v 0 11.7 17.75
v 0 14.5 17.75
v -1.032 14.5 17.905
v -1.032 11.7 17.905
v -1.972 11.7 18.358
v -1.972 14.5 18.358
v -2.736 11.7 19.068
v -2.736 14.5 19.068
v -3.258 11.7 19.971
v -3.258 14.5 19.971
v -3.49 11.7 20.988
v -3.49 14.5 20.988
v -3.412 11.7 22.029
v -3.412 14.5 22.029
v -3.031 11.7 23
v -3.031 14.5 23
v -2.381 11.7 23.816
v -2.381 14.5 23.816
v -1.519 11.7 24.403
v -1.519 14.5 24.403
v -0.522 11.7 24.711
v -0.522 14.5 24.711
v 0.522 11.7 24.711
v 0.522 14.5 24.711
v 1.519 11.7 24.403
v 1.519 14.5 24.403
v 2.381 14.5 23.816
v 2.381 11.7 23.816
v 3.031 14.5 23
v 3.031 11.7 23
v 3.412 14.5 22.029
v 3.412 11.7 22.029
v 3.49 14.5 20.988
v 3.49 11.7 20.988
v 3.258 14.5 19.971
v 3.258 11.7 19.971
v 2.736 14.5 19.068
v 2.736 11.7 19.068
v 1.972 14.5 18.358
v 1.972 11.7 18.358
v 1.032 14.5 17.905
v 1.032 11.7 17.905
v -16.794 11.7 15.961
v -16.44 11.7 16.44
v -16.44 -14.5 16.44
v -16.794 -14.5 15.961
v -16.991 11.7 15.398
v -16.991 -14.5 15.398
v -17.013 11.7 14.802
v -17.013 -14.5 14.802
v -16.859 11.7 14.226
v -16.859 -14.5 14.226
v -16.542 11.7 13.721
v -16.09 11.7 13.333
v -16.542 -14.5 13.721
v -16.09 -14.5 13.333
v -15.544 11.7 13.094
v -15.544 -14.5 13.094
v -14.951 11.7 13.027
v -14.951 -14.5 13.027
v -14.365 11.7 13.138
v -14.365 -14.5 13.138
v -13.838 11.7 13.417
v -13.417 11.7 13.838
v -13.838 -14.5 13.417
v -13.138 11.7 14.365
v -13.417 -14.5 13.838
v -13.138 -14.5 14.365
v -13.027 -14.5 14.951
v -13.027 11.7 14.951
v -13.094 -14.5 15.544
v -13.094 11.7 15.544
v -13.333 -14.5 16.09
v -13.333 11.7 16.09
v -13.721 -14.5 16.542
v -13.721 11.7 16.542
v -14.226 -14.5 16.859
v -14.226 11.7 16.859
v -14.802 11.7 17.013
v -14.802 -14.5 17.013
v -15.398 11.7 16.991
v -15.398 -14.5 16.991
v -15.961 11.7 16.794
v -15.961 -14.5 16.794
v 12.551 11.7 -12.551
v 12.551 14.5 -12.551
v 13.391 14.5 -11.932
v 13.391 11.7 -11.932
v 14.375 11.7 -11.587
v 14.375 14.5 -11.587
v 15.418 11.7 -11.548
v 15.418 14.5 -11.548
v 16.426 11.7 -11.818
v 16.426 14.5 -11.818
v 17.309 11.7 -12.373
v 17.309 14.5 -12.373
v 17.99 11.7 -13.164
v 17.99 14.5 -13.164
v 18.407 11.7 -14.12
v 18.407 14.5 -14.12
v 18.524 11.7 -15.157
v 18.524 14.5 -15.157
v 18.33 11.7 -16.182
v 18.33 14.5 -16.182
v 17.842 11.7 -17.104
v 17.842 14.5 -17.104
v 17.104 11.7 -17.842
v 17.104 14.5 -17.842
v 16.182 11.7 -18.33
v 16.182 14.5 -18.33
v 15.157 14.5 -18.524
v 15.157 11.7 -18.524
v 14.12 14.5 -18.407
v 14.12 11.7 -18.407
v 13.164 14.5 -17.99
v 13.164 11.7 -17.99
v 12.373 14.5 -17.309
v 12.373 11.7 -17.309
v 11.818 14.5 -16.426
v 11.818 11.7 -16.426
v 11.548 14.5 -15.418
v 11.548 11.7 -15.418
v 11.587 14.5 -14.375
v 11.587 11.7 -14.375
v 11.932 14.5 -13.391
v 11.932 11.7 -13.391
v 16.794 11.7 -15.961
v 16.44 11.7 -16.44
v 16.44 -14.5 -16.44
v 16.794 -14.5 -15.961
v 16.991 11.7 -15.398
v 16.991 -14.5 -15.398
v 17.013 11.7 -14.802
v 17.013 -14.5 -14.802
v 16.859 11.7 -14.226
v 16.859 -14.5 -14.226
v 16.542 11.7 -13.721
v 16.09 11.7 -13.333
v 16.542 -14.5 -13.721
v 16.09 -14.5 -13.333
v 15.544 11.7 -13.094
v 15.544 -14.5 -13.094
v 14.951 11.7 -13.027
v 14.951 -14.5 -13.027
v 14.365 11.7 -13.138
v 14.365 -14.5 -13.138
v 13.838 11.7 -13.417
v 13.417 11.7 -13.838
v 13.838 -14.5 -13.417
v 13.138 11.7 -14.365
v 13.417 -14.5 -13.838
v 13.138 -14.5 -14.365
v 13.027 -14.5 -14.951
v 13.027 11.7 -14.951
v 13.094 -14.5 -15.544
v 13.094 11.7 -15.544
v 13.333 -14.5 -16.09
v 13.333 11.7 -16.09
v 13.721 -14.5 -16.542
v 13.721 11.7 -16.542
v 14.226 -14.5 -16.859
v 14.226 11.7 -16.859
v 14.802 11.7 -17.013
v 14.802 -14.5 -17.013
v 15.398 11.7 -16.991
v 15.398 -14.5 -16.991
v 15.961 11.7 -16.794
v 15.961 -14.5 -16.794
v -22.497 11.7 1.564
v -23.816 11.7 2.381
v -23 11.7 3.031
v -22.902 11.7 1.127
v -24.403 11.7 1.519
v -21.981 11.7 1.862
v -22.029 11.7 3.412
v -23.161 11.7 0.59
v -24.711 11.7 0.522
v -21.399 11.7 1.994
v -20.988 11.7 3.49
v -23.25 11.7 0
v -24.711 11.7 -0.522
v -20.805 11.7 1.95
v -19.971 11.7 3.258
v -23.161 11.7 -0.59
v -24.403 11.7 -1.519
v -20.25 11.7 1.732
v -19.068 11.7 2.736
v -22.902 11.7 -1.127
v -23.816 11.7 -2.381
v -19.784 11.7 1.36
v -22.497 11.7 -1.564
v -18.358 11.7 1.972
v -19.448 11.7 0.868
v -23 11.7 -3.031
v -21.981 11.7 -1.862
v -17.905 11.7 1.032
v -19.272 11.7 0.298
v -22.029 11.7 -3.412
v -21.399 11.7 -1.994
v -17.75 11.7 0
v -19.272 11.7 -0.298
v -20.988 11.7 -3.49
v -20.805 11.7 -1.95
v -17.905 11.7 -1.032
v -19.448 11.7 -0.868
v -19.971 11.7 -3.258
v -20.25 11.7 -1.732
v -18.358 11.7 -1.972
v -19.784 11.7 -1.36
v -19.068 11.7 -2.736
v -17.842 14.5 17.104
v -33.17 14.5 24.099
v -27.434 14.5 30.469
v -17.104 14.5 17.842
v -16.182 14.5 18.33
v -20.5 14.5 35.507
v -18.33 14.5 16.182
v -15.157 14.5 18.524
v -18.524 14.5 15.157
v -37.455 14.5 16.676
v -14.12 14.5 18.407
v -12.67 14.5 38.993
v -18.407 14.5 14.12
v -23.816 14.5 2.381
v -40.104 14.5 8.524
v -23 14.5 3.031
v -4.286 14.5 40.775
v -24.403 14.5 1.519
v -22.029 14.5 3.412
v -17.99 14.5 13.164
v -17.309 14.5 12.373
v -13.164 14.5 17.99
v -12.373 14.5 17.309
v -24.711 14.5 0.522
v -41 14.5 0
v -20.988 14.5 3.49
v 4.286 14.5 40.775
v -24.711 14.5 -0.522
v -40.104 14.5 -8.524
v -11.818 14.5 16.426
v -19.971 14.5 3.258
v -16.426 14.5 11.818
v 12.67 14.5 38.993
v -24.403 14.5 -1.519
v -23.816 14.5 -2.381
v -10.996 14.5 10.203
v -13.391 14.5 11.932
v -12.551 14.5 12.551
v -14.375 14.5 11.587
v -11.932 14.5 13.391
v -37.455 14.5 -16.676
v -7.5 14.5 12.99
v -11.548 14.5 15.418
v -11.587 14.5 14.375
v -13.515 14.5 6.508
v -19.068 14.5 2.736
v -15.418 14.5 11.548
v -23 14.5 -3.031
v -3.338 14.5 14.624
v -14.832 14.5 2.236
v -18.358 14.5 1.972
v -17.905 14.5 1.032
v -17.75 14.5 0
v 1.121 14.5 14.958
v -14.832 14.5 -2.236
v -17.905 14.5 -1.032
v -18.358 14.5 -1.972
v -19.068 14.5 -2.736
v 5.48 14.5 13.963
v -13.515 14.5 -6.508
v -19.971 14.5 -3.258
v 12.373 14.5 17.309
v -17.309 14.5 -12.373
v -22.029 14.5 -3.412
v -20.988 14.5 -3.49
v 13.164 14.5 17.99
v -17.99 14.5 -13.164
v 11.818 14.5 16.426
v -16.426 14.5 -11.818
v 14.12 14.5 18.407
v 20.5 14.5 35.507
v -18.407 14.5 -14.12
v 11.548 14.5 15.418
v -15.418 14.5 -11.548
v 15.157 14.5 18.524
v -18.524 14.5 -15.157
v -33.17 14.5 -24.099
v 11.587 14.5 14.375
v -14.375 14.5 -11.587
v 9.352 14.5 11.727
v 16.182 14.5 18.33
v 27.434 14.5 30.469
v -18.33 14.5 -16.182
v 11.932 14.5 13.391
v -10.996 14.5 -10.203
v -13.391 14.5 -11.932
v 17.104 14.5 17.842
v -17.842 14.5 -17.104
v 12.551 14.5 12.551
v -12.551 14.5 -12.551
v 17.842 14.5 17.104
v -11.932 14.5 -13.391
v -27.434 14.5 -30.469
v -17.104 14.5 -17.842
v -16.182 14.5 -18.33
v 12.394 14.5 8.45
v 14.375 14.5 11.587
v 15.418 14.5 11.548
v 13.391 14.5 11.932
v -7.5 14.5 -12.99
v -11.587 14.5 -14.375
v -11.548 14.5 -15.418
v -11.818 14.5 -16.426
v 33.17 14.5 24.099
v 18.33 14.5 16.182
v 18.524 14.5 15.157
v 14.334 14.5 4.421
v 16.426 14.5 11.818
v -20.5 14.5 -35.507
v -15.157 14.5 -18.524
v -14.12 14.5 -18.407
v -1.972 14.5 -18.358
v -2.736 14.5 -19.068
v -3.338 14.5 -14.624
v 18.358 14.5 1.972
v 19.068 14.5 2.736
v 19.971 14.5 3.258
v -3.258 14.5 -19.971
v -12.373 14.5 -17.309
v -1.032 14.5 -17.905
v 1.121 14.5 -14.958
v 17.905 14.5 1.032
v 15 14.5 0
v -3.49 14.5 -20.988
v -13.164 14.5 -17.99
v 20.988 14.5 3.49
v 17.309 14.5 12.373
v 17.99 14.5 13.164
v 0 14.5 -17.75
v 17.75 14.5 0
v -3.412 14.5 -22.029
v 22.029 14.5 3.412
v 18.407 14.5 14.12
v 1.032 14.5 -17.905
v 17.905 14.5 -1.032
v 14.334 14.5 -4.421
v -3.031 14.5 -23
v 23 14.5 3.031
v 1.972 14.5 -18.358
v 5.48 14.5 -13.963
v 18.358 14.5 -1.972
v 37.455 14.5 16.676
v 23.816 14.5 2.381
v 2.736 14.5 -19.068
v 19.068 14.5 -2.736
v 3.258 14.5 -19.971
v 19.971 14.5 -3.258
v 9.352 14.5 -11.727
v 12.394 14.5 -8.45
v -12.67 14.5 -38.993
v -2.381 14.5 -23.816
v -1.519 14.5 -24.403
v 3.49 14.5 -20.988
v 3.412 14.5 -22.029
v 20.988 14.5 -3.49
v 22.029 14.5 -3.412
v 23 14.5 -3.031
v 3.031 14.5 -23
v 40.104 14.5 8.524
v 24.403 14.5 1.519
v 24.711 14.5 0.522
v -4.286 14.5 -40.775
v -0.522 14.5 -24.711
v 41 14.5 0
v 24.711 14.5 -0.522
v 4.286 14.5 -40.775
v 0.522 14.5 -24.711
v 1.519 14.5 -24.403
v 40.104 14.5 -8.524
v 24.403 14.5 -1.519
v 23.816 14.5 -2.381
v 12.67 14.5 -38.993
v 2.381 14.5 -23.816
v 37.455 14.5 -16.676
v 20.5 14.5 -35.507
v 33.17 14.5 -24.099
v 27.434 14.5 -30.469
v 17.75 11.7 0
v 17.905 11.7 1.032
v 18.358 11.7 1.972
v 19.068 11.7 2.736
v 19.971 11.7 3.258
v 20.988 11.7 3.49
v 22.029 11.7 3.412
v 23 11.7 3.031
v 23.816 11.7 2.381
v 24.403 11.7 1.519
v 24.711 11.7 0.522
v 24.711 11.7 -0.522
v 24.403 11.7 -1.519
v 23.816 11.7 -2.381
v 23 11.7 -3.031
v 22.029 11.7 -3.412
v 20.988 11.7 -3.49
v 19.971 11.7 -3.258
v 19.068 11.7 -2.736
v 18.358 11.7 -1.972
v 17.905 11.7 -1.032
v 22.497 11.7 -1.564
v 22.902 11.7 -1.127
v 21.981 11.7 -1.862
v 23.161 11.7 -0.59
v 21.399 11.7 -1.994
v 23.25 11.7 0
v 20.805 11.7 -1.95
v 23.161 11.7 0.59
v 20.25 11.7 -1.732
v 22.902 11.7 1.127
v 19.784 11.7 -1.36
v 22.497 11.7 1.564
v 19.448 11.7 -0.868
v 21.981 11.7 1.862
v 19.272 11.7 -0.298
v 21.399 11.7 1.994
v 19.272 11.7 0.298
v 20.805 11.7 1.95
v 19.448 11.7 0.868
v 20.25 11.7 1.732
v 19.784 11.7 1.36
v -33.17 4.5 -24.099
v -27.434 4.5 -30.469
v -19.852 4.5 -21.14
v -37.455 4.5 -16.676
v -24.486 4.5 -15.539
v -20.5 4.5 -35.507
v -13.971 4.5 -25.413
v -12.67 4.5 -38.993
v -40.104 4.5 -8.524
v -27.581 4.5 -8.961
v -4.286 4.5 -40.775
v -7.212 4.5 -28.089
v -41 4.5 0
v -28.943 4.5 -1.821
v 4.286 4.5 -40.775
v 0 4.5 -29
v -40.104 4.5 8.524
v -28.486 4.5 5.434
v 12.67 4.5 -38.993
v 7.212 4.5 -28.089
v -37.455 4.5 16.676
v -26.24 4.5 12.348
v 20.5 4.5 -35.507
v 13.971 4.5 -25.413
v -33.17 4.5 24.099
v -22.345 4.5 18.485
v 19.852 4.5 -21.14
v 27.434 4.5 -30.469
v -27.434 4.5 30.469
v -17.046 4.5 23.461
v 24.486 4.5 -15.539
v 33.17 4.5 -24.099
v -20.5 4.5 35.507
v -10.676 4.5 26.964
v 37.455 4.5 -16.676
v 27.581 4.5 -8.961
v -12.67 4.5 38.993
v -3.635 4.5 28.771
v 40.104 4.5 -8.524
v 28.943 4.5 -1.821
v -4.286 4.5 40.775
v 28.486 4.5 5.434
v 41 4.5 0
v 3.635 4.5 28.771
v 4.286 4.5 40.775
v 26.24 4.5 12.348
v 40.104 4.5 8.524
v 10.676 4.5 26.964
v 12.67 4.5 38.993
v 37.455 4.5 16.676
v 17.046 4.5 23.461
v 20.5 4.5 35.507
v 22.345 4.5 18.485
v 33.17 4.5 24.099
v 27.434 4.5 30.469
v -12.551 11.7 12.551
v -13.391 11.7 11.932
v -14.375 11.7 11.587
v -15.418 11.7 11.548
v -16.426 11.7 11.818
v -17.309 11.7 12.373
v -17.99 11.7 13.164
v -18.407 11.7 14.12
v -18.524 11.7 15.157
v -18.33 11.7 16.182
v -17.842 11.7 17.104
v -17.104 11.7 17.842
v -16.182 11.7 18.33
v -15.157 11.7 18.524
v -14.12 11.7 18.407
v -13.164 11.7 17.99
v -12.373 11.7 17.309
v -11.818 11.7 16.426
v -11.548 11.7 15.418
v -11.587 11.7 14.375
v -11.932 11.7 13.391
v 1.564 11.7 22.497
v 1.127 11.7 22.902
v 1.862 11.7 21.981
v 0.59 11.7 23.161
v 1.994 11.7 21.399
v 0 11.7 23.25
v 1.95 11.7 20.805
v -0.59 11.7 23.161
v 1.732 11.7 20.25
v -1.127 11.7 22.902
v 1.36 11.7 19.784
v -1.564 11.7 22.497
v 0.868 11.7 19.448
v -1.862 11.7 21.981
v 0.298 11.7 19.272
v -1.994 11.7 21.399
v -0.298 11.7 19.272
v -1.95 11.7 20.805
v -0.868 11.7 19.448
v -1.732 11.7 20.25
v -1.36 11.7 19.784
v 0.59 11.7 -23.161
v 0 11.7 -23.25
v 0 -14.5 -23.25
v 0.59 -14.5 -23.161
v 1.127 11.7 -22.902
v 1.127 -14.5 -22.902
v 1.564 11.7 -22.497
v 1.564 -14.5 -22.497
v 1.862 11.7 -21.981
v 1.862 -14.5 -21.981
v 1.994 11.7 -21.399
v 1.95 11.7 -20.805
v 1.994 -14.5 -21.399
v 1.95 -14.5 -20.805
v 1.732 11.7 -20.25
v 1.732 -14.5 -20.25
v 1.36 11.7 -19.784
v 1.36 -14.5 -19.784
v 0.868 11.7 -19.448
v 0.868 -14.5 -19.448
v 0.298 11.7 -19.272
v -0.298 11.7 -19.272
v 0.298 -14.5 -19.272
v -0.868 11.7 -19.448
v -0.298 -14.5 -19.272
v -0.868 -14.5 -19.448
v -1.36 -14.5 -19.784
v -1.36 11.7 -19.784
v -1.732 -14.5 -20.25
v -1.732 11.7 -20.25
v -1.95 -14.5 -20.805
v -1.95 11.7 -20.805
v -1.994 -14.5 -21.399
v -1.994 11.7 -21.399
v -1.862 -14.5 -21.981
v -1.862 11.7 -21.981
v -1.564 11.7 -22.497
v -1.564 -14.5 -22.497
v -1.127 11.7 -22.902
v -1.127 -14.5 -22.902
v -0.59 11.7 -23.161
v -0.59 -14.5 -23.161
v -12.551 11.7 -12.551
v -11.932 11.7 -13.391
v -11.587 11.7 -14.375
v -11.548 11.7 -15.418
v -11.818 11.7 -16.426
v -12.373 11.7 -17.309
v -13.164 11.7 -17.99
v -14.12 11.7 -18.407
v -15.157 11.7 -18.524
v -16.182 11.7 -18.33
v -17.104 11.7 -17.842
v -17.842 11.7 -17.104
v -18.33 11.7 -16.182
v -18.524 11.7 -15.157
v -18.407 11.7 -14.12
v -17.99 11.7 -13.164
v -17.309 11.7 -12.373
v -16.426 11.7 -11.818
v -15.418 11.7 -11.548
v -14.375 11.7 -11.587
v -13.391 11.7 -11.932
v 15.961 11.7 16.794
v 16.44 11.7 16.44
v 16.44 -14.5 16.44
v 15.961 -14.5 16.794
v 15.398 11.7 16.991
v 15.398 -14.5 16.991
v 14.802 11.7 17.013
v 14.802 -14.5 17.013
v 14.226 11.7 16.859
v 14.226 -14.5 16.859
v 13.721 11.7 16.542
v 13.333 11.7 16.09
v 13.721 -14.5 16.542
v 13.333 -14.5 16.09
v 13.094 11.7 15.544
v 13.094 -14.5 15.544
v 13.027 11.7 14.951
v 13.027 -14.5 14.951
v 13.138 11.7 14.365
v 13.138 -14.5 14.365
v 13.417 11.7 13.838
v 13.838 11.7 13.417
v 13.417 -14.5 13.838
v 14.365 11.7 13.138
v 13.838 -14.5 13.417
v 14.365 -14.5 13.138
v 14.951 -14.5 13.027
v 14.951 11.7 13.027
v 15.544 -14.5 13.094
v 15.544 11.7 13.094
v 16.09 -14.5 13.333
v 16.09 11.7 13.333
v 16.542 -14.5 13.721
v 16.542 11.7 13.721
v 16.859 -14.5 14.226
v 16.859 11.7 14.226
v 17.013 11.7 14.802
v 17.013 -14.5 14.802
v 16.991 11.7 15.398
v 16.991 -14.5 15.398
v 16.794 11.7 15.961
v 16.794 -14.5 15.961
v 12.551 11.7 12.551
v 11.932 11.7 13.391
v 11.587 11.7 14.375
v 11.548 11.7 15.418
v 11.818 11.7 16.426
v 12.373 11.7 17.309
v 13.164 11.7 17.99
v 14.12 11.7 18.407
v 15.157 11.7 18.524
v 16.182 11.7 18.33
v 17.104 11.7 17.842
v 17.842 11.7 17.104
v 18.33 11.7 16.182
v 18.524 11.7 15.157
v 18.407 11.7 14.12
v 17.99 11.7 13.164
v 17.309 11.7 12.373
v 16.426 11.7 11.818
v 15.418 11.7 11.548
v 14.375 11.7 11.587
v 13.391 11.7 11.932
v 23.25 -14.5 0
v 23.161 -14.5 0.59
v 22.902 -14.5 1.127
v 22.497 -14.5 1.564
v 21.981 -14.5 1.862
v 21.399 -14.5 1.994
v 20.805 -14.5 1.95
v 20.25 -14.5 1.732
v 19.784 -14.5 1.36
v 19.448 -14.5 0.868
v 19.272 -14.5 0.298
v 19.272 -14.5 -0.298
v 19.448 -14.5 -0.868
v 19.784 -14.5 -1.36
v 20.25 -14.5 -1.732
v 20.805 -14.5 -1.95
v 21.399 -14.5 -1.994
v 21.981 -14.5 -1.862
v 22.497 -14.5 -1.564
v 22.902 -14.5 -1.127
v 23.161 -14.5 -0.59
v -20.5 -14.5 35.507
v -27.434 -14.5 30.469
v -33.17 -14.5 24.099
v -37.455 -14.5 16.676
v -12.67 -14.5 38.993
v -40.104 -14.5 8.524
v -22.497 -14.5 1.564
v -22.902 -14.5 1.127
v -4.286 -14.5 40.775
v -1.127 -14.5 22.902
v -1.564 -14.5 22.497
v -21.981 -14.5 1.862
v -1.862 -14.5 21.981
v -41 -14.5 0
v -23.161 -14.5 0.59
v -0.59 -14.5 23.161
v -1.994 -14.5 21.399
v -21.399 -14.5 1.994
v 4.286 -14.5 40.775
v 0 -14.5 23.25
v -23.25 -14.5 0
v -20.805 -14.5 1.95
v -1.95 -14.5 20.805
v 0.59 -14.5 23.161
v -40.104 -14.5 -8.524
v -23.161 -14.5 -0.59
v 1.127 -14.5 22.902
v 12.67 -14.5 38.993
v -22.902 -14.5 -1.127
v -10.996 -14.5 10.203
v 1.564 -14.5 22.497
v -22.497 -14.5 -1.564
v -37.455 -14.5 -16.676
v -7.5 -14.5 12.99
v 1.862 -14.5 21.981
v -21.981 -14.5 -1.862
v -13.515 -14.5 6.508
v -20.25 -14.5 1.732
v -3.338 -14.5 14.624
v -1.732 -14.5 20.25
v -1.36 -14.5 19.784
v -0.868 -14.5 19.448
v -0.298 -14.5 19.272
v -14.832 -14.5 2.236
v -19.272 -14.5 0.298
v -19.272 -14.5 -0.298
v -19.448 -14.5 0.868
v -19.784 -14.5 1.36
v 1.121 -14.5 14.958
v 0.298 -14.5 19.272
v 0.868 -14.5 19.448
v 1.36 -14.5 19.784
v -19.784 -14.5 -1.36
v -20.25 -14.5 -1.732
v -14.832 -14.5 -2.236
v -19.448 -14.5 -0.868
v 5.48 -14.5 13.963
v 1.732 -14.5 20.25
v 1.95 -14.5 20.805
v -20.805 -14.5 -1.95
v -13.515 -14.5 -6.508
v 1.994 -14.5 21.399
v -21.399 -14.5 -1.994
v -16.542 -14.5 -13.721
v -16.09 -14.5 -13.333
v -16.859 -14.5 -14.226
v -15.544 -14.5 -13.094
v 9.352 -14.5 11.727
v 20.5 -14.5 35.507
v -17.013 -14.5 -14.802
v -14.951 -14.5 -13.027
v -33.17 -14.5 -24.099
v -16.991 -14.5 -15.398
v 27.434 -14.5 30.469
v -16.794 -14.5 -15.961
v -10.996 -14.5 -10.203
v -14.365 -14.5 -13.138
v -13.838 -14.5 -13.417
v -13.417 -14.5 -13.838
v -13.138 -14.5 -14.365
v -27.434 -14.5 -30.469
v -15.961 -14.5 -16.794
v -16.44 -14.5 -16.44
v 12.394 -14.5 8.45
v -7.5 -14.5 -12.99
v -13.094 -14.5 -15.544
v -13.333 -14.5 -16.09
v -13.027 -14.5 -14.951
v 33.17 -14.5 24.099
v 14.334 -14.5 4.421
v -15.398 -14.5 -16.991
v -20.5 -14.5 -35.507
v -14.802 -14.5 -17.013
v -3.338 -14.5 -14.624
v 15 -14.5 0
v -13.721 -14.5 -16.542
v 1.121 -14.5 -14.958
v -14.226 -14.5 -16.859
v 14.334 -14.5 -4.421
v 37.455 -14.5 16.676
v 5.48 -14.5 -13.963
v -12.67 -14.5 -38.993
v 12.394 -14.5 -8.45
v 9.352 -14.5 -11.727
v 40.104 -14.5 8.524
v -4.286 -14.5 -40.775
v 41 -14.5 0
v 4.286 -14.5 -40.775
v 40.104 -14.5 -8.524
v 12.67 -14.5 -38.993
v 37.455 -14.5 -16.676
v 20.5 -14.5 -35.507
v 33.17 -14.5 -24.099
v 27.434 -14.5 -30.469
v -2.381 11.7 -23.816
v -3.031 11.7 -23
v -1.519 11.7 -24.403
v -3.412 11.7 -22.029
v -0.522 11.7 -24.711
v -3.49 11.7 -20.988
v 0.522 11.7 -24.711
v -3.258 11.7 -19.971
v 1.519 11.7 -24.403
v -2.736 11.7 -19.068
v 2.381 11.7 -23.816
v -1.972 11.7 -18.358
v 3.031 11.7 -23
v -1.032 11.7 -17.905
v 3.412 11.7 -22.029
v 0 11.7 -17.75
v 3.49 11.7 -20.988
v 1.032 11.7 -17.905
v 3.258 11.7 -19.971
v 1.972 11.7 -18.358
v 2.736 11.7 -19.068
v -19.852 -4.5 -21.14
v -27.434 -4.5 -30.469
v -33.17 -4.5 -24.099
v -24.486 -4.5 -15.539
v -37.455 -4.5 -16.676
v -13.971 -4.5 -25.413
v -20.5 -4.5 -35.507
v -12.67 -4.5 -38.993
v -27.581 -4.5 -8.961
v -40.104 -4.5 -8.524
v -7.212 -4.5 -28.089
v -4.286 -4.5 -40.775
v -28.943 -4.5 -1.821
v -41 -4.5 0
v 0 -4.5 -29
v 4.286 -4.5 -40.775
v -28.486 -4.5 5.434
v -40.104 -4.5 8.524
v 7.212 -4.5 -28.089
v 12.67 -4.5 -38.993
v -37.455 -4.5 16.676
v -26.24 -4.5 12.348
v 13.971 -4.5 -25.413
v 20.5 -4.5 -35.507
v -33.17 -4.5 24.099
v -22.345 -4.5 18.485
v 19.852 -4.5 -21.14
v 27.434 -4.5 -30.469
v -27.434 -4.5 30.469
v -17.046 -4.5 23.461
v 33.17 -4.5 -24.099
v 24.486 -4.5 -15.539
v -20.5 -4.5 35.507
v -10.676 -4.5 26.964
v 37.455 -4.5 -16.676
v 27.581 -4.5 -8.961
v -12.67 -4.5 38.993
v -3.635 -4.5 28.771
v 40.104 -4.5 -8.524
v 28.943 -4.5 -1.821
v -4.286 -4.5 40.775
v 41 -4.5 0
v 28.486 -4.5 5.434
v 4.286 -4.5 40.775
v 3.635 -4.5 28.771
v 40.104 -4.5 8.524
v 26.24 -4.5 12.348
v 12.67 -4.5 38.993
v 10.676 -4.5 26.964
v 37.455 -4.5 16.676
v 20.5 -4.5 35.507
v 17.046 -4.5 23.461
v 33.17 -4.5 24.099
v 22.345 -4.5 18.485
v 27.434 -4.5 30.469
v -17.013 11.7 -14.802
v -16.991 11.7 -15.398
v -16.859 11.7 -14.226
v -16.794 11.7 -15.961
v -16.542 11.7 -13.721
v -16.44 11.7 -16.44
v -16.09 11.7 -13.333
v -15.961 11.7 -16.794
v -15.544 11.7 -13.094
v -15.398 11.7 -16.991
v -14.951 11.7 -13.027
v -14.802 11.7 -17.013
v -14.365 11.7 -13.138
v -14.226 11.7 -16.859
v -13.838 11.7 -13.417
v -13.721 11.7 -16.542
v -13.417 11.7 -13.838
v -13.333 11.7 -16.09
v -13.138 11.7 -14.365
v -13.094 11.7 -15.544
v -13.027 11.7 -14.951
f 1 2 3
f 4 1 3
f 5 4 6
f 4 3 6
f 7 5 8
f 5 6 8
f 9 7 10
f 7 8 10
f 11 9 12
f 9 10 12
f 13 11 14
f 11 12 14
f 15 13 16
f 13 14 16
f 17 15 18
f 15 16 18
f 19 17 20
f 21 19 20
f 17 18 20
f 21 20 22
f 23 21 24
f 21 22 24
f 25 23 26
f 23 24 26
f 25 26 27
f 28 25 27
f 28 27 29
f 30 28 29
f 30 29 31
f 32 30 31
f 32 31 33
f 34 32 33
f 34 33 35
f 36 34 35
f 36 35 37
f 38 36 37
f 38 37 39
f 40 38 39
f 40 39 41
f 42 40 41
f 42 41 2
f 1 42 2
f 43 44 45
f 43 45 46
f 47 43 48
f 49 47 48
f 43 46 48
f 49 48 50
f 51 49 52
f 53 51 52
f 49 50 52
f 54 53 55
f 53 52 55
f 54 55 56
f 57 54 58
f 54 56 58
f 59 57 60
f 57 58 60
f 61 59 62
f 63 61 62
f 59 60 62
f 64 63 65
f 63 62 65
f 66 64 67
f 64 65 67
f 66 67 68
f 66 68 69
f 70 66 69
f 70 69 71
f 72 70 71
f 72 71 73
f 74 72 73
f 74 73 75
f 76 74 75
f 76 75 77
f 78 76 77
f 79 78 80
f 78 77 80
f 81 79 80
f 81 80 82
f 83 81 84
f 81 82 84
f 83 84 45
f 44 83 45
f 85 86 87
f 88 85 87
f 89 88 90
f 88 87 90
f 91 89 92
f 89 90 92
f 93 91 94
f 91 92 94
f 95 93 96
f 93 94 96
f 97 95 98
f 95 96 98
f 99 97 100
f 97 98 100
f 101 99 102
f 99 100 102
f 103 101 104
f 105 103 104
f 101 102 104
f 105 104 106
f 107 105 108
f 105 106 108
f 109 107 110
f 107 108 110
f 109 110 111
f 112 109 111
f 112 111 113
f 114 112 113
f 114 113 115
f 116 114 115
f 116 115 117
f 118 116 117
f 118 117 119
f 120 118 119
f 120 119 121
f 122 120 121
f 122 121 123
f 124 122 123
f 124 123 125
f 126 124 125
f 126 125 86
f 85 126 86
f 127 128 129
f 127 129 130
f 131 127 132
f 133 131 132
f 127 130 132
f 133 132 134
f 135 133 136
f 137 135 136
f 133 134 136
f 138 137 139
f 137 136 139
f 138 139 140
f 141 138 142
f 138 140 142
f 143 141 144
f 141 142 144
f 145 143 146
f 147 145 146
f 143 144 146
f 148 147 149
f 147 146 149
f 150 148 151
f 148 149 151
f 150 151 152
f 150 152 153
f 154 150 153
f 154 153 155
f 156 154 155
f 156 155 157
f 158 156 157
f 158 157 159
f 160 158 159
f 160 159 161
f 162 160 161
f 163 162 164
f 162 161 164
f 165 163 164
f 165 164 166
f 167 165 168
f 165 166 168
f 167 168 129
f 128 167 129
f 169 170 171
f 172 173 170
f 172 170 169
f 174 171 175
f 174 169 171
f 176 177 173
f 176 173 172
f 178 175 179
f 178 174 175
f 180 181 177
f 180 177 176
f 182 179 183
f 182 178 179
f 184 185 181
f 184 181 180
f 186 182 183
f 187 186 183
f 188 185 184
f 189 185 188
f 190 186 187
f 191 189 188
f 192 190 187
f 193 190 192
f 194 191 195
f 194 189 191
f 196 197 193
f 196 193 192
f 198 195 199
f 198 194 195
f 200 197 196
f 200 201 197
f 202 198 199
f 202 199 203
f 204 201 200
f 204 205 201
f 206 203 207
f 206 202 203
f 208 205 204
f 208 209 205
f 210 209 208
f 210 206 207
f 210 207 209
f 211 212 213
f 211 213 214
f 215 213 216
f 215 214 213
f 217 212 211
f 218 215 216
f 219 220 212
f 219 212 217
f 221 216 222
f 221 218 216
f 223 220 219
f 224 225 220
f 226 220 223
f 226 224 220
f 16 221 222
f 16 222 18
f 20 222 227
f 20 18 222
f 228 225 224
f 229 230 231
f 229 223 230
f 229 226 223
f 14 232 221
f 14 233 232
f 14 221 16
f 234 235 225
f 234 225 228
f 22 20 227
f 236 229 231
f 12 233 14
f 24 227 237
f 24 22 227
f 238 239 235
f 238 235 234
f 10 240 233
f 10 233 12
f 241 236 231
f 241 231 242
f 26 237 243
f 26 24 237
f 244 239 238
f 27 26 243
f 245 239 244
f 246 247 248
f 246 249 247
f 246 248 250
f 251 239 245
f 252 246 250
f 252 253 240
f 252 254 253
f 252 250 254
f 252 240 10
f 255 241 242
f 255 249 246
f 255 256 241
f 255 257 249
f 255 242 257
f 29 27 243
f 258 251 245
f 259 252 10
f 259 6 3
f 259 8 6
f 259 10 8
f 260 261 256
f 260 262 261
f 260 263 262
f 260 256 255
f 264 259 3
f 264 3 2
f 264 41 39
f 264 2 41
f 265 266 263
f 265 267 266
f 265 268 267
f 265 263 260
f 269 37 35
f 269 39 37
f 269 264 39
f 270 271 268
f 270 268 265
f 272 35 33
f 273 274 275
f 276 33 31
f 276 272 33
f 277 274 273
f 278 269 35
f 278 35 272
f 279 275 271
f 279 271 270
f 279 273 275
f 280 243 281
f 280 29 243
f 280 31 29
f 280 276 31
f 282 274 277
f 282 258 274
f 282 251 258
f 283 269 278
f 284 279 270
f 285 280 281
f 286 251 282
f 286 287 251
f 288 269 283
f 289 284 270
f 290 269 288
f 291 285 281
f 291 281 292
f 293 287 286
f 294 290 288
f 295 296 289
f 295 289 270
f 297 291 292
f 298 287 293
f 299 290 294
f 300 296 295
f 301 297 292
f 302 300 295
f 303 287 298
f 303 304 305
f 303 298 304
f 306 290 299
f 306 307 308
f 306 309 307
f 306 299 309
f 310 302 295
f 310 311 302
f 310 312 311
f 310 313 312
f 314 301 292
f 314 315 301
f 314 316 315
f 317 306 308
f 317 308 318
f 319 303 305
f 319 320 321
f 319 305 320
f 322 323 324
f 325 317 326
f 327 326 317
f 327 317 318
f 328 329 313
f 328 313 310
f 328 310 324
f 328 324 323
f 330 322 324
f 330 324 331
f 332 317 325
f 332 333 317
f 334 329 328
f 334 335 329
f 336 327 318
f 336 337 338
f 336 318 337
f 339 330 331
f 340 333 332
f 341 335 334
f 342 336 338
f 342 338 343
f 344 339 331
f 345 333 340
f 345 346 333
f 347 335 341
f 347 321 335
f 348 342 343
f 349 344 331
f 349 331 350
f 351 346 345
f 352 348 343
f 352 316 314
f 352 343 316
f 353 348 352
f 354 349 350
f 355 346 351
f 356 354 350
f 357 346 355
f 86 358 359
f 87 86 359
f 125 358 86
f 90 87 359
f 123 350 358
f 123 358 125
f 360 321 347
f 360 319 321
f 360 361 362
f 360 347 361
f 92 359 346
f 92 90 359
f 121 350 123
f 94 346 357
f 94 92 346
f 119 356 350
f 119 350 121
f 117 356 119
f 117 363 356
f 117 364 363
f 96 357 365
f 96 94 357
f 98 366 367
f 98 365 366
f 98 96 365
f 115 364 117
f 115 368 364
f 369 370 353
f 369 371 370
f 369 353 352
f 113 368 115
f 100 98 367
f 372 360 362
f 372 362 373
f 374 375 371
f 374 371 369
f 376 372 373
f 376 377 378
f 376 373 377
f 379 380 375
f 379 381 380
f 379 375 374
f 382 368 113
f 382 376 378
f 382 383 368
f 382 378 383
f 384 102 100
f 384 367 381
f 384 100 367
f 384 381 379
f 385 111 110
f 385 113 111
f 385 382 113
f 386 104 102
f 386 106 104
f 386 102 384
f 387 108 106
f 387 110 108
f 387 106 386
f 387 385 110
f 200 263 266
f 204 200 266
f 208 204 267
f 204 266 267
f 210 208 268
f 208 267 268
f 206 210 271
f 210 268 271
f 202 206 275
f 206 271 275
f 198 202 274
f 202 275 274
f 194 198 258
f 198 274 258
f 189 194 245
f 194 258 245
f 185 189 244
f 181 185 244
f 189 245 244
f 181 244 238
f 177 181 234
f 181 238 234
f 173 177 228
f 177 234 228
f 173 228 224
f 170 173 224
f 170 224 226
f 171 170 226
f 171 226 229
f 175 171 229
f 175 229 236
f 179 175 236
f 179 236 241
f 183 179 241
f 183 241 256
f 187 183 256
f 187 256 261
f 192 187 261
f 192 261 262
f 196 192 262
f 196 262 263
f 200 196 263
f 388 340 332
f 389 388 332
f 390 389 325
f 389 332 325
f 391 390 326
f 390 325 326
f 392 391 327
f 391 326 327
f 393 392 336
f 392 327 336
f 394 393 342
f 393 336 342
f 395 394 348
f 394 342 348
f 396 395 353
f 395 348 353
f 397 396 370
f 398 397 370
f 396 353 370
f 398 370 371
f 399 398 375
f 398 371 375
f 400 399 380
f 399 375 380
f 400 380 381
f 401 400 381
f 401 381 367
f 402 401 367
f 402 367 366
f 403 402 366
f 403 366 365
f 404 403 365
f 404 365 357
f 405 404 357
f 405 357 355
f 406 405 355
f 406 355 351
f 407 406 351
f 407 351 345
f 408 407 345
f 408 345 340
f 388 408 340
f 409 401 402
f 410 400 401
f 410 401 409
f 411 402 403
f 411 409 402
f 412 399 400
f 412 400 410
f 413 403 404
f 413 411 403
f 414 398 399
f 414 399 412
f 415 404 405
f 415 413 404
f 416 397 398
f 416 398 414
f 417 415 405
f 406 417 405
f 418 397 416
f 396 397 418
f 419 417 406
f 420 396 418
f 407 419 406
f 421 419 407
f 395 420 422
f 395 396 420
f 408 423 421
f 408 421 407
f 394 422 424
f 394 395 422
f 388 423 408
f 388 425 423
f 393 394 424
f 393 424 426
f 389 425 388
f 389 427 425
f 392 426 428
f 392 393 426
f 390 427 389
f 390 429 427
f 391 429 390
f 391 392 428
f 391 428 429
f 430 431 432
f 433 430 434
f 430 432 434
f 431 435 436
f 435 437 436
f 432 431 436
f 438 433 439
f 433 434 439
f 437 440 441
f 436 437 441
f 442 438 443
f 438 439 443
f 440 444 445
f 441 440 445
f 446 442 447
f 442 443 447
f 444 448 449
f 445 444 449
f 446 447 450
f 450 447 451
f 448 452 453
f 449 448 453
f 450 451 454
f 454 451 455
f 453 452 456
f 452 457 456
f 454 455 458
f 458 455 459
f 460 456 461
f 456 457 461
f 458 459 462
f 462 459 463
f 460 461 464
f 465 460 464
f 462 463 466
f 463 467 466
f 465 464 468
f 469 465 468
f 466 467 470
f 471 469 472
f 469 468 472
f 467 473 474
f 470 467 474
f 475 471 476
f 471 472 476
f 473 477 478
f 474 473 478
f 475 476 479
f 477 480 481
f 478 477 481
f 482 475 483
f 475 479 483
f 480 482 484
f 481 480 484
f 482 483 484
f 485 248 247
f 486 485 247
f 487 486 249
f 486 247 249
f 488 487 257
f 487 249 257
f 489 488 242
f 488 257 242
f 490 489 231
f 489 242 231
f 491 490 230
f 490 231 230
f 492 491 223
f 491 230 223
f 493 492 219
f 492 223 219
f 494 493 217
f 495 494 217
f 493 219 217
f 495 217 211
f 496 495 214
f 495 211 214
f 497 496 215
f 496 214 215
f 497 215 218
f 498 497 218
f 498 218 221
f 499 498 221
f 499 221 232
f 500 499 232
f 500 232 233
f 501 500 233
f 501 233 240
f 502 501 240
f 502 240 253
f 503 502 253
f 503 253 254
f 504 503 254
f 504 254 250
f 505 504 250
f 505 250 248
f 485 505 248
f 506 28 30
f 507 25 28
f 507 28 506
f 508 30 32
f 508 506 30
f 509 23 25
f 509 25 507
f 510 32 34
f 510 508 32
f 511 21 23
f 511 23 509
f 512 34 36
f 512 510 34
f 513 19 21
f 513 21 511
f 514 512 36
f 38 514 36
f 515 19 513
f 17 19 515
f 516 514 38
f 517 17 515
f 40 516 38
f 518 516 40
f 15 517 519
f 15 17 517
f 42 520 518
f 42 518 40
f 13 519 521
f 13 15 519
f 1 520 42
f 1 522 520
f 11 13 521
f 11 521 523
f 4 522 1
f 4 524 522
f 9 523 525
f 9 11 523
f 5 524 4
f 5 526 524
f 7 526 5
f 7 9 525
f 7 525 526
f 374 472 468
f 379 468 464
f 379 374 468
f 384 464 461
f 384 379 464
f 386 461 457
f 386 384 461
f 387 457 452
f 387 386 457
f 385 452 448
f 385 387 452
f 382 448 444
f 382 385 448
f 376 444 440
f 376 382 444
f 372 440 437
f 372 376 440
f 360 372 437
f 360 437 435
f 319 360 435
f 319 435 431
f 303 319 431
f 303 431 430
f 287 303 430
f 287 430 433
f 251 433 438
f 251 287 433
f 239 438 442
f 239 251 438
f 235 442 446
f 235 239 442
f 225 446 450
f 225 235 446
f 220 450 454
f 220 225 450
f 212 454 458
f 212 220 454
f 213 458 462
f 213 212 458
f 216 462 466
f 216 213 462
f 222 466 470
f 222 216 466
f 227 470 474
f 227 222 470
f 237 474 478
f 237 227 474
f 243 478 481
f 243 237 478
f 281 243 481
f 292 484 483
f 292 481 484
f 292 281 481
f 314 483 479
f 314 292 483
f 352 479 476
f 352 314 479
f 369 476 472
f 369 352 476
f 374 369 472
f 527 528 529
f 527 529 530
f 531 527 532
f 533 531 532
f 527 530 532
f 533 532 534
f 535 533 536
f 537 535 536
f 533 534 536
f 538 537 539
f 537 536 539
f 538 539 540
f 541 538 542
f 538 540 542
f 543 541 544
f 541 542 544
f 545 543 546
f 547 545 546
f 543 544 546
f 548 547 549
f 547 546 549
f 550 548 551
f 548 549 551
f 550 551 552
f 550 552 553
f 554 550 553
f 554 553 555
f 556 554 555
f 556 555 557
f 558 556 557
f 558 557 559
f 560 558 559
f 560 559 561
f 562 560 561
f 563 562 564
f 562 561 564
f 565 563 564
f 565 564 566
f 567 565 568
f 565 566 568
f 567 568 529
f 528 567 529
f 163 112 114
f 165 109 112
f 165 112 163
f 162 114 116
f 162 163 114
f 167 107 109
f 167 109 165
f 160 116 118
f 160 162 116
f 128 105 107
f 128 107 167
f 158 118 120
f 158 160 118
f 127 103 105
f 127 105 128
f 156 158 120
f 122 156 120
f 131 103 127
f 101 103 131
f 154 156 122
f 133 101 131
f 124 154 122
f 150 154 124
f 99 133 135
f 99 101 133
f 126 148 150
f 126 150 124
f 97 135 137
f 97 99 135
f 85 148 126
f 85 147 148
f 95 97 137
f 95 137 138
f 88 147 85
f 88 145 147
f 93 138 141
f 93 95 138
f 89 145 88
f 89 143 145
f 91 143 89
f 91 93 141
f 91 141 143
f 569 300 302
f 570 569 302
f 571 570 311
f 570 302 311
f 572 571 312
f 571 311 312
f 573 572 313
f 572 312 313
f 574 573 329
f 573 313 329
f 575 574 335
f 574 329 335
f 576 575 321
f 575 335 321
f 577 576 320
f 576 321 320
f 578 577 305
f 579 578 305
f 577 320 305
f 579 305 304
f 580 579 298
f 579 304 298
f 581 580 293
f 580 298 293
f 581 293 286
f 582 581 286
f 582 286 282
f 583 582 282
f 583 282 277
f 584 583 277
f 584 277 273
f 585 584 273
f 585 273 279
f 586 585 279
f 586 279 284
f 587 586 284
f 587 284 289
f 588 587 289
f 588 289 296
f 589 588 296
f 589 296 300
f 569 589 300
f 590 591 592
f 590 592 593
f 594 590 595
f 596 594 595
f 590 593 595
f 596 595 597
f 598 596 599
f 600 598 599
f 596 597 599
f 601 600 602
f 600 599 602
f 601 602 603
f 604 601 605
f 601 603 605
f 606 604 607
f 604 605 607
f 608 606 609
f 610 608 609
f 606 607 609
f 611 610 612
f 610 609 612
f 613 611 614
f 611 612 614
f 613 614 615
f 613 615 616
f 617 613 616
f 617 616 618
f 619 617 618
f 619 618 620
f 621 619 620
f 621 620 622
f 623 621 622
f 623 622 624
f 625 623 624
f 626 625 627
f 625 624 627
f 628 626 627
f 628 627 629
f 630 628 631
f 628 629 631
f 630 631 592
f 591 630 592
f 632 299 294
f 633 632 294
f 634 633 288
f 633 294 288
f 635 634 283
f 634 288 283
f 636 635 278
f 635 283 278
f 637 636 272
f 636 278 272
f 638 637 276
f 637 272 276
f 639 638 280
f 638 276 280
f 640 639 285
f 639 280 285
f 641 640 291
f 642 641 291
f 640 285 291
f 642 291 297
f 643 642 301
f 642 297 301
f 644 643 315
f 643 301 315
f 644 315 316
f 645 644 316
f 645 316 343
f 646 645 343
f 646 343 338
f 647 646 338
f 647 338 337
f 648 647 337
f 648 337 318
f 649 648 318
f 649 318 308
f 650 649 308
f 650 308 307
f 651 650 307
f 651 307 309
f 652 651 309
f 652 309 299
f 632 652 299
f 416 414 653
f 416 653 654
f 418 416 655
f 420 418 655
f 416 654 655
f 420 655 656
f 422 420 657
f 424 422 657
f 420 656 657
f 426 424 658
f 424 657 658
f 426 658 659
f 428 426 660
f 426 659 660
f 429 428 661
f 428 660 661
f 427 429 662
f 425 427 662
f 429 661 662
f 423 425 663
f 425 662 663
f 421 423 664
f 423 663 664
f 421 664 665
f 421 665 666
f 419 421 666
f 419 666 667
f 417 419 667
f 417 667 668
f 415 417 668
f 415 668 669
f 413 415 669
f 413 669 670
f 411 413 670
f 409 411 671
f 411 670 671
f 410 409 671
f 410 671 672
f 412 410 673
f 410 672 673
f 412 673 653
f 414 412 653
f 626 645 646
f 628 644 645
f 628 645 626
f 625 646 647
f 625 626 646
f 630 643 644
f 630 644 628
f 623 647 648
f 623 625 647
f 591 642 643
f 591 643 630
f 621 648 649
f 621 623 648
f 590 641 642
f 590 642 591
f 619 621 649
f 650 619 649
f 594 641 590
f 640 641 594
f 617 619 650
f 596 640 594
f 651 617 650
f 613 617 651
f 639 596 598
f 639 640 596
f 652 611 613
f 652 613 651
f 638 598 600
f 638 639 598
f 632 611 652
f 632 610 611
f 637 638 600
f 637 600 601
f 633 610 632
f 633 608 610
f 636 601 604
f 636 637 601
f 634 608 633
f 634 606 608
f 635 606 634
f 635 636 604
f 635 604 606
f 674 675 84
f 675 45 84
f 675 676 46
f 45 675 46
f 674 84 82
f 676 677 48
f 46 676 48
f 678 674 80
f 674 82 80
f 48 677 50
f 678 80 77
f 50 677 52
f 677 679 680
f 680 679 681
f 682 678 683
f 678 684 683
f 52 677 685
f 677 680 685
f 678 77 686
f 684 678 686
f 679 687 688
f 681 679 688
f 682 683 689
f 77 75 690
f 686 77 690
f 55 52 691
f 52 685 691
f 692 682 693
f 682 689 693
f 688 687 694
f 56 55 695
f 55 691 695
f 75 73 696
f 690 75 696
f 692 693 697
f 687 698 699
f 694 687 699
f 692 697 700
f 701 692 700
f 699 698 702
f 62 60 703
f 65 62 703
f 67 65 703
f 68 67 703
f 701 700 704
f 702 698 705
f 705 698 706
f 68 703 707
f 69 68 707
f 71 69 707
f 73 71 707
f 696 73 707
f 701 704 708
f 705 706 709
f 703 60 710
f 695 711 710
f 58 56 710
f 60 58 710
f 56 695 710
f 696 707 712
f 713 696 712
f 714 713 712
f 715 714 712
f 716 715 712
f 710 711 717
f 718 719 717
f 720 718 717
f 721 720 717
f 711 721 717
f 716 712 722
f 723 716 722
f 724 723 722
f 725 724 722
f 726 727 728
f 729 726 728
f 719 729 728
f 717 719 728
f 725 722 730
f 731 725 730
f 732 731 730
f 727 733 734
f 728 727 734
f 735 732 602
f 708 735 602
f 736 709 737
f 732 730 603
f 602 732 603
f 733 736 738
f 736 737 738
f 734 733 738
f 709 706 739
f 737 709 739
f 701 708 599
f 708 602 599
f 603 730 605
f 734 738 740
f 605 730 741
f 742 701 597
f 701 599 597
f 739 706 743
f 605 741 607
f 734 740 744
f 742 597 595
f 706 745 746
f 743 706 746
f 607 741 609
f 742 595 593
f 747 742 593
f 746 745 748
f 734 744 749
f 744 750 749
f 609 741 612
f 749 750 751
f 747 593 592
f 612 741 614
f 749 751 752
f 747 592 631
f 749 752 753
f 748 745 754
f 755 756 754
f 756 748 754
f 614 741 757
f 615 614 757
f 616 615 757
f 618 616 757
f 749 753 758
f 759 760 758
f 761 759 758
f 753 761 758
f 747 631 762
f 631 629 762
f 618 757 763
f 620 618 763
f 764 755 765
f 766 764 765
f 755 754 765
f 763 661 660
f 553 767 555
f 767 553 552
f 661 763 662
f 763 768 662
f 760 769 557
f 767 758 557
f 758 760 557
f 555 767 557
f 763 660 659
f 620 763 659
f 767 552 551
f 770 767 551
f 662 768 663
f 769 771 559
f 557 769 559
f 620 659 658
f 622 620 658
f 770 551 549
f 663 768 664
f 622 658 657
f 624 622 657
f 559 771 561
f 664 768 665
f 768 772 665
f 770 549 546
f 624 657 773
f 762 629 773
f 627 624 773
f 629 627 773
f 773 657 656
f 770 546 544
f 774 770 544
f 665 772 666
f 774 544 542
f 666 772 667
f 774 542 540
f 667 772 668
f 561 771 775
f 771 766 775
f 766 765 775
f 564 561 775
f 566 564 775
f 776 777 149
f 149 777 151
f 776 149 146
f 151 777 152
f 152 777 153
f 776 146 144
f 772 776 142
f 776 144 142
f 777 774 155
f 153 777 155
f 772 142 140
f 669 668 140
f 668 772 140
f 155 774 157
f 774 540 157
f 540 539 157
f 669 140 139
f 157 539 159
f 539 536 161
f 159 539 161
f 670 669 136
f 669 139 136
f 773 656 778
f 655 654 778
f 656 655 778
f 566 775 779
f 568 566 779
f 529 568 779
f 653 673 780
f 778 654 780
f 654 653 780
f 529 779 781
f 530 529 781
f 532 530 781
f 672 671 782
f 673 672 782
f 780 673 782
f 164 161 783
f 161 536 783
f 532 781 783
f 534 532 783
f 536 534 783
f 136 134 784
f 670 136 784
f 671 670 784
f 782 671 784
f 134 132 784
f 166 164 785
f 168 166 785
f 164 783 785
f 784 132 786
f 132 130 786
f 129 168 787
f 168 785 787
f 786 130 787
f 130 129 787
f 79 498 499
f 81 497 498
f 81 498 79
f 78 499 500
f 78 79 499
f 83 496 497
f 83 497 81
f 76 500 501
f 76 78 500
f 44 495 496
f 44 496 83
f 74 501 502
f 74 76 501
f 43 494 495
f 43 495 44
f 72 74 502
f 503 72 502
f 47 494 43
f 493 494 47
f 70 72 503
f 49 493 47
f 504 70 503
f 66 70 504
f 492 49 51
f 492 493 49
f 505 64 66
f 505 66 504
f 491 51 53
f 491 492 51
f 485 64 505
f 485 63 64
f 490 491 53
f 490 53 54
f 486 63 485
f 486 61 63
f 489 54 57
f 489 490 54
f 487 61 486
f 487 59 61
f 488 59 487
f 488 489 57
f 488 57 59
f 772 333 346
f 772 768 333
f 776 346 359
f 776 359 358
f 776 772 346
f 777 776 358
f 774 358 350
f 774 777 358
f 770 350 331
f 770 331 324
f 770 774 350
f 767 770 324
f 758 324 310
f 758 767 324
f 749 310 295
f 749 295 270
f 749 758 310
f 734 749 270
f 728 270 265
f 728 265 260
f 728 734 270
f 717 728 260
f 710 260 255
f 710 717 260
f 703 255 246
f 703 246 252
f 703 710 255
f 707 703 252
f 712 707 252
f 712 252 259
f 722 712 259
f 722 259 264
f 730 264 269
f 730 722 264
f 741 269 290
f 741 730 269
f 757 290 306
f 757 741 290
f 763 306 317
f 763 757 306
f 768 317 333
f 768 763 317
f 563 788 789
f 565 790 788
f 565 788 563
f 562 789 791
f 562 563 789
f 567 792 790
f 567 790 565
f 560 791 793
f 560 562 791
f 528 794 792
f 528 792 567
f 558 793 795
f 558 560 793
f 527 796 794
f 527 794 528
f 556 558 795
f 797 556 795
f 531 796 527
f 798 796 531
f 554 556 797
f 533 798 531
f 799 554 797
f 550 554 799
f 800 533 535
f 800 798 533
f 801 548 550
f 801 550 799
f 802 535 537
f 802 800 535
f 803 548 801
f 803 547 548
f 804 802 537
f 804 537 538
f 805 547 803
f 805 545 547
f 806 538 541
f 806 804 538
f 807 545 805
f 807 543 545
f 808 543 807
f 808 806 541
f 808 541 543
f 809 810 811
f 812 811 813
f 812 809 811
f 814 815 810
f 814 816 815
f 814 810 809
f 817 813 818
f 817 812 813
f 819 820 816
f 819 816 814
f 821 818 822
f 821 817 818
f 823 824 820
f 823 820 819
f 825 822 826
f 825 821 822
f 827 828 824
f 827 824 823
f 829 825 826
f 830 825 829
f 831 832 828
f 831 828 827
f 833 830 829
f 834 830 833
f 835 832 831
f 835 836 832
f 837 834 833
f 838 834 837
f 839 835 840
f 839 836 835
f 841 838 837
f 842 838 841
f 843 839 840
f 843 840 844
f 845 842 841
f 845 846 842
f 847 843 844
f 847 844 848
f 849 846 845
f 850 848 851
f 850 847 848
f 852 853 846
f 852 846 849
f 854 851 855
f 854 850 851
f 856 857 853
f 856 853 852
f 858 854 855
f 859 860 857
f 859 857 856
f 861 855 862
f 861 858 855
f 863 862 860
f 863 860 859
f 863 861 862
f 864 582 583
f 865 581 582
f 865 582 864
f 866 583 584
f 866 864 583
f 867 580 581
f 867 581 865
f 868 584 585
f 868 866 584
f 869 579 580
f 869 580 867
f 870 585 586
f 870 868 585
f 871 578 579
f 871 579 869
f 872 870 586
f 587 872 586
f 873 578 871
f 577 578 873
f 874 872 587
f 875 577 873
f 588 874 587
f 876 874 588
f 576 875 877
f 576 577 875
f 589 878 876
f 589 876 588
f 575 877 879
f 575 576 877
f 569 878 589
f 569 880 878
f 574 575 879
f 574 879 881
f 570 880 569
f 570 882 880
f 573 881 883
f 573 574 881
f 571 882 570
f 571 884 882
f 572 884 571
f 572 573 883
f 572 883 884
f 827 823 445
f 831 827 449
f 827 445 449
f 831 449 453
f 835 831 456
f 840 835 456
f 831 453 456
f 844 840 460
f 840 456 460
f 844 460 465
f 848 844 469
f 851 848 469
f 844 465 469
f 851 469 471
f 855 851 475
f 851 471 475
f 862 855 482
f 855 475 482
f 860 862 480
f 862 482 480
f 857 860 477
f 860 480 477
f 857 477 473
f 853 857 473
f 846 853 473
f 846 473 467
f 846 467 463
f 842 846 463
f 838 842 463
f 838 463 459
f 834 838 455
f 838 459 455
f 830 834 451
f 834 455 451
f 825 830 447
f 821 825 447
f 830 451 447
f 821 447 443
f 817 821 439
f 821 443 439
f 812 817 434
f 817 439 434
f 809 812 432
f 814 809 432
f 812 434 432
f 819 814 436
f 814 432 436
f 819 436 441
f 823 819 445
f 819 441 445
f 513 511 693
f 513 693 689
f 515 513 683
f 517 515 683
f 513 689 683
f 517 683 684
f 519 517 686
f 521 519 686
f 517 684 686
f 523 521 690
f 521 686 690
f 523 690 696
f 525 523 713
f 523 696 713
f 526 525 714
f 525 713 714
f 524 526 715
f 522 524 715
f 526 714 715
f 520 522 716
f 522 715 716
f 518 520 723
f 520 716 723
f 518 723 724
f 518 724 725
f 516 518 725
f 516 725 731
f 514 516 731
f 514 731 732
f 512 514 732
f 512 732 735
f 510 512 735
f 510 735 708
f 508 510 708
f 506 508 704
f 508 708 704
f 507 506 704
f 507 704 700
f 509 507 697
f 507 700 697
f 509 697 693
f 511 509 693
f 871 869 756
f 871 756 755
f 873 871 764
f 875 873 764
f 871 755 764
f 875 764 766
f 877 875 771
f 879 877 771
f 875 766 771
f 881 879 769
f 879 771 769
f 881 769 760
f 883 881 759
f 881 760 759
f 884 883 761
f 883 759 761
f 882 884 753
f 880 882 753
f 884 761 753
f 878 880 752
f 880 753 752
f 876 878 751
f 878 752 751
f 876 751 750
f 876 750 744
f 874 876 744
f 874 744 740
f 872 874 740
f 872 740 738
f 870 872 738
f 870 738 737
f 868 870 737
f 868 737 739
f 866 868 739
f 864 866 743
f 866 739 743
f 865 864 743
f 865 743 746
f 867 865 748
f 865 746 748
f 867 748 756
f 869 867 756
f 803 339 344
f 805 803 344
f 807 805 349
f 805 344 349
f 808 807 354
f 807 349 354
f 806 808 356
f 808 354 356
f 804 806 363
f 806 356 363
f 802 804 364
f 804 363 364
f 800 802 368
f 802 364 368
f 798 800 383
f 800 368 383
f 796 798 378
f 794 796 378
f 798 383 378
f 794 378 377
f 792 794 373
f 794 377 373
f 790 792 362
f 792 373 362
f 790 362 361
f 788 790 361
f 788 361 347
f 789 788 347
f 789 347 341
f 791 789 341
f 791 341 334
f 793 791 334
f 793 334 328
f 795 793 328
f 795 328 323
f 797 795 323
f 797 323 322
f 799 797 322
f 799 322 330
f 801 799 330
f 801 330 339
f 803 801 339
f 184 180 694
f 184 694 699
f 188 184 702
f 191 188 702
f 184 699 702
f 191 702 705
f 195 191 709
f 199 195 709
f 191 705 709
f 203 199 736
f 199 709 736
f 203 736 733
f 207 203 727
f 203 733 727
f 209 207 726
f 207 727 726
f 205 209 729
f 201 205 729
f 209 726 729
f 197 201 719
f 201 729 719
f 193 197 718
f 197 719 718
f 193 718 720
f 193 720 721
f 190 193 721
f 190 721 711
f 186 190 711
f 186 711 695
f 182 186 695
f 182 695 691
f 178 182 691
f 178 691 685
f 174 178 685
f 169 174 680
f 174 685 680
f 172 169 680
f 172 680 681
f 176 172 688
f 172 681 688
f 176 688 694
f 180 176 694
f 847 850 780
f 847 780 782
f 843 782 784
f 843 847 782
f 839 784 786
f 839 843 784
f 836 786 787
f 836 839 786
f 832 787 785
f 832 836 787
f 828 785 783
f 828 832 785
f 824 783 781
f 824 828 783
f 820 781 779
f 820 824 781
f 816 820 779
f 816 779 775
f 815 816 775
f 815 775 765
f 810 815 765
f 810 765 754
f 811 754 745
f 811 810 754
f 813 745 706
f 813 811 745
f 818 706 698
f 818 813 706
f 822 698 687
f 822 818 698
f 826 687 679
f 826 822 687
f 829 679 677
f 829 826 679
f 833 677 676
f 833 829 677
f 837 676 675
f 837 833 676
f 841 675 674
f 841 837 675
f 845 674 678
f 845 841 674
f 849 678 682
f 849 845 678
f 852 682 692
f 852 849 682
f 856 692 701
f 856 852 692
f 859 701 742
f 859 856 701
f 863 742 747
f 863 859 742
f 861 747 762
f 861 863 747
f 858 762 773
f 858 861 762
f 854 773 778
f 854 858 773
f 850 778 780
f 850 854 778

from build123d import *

# Parameters (mm, degrees)
SKETCH1_R           = 41
SKETCH1_R_2         = 15
BOSS_EXTRUDE1_DEPTH = 14.5
SKETCH3_W           = 12
SKETCH3_H           = 9
HOLE1_D             = 4
HOLE1_CBORE_D       = 7
HOLE1_CBORE_DEPTH   = 2.8
CIRPATTERN1_COUNT   = 8


with BuildPart() as part:
    # Sketch1 → Boss-Extrude1 (new body, symmetric)
    with BuildSketch(Plane(origin=(0, 0, 0), x_dir=(1, 0, 0), z_dir=(0, 1, 0))):
        Circle(SKETCH1_R)
        Circle(SKETCH1_R_2, mode=Mode.SUBTRACT)
    extrude(amount=BOSS_EXTRUDE1_DEPTH, both=True)

    # Sketch3 → Cut-Revolve1 (revolve, cut)
    with BuildSketch(Plane(origin=(0, 0, 0), x_dir=(0, 0, -1), z_dir=(1, 0, 0))):
        with Locations((35, 0)):
            Rectangle(SKETCH3_W, SKETCH3_H)
    revolve(axis=Axis((0, 14.5, 0), (0, -1, 0)), mode=Mode.SUBTRACT)

    # Hole1 (through all)
    with Locations(Plane(origin=(0, 14.5, -21.25), x_dir=(0, 0, 1), z_dir=(0, 1, 0))):
        with Locations((0, 0)):
            hole1 = CounterBoreHole(HOLE1_D / 2, HOLE1_CBORE_D / 2, HOLE1_CBORE_DEPTH)

    # CirPattern1: Hole1 ×8 about axis
    cirpattern1_axis = Axis((0, 0, 0), (0, 1, 0))
    for i in range(1, CIRPATTERN1_COUNT):
        add(hole1.rotate(cirpattern1_axis, i * 360 / CIRPATTERN1_COUNT), mode=Mode.SUBTRACT)


solid = part.part
